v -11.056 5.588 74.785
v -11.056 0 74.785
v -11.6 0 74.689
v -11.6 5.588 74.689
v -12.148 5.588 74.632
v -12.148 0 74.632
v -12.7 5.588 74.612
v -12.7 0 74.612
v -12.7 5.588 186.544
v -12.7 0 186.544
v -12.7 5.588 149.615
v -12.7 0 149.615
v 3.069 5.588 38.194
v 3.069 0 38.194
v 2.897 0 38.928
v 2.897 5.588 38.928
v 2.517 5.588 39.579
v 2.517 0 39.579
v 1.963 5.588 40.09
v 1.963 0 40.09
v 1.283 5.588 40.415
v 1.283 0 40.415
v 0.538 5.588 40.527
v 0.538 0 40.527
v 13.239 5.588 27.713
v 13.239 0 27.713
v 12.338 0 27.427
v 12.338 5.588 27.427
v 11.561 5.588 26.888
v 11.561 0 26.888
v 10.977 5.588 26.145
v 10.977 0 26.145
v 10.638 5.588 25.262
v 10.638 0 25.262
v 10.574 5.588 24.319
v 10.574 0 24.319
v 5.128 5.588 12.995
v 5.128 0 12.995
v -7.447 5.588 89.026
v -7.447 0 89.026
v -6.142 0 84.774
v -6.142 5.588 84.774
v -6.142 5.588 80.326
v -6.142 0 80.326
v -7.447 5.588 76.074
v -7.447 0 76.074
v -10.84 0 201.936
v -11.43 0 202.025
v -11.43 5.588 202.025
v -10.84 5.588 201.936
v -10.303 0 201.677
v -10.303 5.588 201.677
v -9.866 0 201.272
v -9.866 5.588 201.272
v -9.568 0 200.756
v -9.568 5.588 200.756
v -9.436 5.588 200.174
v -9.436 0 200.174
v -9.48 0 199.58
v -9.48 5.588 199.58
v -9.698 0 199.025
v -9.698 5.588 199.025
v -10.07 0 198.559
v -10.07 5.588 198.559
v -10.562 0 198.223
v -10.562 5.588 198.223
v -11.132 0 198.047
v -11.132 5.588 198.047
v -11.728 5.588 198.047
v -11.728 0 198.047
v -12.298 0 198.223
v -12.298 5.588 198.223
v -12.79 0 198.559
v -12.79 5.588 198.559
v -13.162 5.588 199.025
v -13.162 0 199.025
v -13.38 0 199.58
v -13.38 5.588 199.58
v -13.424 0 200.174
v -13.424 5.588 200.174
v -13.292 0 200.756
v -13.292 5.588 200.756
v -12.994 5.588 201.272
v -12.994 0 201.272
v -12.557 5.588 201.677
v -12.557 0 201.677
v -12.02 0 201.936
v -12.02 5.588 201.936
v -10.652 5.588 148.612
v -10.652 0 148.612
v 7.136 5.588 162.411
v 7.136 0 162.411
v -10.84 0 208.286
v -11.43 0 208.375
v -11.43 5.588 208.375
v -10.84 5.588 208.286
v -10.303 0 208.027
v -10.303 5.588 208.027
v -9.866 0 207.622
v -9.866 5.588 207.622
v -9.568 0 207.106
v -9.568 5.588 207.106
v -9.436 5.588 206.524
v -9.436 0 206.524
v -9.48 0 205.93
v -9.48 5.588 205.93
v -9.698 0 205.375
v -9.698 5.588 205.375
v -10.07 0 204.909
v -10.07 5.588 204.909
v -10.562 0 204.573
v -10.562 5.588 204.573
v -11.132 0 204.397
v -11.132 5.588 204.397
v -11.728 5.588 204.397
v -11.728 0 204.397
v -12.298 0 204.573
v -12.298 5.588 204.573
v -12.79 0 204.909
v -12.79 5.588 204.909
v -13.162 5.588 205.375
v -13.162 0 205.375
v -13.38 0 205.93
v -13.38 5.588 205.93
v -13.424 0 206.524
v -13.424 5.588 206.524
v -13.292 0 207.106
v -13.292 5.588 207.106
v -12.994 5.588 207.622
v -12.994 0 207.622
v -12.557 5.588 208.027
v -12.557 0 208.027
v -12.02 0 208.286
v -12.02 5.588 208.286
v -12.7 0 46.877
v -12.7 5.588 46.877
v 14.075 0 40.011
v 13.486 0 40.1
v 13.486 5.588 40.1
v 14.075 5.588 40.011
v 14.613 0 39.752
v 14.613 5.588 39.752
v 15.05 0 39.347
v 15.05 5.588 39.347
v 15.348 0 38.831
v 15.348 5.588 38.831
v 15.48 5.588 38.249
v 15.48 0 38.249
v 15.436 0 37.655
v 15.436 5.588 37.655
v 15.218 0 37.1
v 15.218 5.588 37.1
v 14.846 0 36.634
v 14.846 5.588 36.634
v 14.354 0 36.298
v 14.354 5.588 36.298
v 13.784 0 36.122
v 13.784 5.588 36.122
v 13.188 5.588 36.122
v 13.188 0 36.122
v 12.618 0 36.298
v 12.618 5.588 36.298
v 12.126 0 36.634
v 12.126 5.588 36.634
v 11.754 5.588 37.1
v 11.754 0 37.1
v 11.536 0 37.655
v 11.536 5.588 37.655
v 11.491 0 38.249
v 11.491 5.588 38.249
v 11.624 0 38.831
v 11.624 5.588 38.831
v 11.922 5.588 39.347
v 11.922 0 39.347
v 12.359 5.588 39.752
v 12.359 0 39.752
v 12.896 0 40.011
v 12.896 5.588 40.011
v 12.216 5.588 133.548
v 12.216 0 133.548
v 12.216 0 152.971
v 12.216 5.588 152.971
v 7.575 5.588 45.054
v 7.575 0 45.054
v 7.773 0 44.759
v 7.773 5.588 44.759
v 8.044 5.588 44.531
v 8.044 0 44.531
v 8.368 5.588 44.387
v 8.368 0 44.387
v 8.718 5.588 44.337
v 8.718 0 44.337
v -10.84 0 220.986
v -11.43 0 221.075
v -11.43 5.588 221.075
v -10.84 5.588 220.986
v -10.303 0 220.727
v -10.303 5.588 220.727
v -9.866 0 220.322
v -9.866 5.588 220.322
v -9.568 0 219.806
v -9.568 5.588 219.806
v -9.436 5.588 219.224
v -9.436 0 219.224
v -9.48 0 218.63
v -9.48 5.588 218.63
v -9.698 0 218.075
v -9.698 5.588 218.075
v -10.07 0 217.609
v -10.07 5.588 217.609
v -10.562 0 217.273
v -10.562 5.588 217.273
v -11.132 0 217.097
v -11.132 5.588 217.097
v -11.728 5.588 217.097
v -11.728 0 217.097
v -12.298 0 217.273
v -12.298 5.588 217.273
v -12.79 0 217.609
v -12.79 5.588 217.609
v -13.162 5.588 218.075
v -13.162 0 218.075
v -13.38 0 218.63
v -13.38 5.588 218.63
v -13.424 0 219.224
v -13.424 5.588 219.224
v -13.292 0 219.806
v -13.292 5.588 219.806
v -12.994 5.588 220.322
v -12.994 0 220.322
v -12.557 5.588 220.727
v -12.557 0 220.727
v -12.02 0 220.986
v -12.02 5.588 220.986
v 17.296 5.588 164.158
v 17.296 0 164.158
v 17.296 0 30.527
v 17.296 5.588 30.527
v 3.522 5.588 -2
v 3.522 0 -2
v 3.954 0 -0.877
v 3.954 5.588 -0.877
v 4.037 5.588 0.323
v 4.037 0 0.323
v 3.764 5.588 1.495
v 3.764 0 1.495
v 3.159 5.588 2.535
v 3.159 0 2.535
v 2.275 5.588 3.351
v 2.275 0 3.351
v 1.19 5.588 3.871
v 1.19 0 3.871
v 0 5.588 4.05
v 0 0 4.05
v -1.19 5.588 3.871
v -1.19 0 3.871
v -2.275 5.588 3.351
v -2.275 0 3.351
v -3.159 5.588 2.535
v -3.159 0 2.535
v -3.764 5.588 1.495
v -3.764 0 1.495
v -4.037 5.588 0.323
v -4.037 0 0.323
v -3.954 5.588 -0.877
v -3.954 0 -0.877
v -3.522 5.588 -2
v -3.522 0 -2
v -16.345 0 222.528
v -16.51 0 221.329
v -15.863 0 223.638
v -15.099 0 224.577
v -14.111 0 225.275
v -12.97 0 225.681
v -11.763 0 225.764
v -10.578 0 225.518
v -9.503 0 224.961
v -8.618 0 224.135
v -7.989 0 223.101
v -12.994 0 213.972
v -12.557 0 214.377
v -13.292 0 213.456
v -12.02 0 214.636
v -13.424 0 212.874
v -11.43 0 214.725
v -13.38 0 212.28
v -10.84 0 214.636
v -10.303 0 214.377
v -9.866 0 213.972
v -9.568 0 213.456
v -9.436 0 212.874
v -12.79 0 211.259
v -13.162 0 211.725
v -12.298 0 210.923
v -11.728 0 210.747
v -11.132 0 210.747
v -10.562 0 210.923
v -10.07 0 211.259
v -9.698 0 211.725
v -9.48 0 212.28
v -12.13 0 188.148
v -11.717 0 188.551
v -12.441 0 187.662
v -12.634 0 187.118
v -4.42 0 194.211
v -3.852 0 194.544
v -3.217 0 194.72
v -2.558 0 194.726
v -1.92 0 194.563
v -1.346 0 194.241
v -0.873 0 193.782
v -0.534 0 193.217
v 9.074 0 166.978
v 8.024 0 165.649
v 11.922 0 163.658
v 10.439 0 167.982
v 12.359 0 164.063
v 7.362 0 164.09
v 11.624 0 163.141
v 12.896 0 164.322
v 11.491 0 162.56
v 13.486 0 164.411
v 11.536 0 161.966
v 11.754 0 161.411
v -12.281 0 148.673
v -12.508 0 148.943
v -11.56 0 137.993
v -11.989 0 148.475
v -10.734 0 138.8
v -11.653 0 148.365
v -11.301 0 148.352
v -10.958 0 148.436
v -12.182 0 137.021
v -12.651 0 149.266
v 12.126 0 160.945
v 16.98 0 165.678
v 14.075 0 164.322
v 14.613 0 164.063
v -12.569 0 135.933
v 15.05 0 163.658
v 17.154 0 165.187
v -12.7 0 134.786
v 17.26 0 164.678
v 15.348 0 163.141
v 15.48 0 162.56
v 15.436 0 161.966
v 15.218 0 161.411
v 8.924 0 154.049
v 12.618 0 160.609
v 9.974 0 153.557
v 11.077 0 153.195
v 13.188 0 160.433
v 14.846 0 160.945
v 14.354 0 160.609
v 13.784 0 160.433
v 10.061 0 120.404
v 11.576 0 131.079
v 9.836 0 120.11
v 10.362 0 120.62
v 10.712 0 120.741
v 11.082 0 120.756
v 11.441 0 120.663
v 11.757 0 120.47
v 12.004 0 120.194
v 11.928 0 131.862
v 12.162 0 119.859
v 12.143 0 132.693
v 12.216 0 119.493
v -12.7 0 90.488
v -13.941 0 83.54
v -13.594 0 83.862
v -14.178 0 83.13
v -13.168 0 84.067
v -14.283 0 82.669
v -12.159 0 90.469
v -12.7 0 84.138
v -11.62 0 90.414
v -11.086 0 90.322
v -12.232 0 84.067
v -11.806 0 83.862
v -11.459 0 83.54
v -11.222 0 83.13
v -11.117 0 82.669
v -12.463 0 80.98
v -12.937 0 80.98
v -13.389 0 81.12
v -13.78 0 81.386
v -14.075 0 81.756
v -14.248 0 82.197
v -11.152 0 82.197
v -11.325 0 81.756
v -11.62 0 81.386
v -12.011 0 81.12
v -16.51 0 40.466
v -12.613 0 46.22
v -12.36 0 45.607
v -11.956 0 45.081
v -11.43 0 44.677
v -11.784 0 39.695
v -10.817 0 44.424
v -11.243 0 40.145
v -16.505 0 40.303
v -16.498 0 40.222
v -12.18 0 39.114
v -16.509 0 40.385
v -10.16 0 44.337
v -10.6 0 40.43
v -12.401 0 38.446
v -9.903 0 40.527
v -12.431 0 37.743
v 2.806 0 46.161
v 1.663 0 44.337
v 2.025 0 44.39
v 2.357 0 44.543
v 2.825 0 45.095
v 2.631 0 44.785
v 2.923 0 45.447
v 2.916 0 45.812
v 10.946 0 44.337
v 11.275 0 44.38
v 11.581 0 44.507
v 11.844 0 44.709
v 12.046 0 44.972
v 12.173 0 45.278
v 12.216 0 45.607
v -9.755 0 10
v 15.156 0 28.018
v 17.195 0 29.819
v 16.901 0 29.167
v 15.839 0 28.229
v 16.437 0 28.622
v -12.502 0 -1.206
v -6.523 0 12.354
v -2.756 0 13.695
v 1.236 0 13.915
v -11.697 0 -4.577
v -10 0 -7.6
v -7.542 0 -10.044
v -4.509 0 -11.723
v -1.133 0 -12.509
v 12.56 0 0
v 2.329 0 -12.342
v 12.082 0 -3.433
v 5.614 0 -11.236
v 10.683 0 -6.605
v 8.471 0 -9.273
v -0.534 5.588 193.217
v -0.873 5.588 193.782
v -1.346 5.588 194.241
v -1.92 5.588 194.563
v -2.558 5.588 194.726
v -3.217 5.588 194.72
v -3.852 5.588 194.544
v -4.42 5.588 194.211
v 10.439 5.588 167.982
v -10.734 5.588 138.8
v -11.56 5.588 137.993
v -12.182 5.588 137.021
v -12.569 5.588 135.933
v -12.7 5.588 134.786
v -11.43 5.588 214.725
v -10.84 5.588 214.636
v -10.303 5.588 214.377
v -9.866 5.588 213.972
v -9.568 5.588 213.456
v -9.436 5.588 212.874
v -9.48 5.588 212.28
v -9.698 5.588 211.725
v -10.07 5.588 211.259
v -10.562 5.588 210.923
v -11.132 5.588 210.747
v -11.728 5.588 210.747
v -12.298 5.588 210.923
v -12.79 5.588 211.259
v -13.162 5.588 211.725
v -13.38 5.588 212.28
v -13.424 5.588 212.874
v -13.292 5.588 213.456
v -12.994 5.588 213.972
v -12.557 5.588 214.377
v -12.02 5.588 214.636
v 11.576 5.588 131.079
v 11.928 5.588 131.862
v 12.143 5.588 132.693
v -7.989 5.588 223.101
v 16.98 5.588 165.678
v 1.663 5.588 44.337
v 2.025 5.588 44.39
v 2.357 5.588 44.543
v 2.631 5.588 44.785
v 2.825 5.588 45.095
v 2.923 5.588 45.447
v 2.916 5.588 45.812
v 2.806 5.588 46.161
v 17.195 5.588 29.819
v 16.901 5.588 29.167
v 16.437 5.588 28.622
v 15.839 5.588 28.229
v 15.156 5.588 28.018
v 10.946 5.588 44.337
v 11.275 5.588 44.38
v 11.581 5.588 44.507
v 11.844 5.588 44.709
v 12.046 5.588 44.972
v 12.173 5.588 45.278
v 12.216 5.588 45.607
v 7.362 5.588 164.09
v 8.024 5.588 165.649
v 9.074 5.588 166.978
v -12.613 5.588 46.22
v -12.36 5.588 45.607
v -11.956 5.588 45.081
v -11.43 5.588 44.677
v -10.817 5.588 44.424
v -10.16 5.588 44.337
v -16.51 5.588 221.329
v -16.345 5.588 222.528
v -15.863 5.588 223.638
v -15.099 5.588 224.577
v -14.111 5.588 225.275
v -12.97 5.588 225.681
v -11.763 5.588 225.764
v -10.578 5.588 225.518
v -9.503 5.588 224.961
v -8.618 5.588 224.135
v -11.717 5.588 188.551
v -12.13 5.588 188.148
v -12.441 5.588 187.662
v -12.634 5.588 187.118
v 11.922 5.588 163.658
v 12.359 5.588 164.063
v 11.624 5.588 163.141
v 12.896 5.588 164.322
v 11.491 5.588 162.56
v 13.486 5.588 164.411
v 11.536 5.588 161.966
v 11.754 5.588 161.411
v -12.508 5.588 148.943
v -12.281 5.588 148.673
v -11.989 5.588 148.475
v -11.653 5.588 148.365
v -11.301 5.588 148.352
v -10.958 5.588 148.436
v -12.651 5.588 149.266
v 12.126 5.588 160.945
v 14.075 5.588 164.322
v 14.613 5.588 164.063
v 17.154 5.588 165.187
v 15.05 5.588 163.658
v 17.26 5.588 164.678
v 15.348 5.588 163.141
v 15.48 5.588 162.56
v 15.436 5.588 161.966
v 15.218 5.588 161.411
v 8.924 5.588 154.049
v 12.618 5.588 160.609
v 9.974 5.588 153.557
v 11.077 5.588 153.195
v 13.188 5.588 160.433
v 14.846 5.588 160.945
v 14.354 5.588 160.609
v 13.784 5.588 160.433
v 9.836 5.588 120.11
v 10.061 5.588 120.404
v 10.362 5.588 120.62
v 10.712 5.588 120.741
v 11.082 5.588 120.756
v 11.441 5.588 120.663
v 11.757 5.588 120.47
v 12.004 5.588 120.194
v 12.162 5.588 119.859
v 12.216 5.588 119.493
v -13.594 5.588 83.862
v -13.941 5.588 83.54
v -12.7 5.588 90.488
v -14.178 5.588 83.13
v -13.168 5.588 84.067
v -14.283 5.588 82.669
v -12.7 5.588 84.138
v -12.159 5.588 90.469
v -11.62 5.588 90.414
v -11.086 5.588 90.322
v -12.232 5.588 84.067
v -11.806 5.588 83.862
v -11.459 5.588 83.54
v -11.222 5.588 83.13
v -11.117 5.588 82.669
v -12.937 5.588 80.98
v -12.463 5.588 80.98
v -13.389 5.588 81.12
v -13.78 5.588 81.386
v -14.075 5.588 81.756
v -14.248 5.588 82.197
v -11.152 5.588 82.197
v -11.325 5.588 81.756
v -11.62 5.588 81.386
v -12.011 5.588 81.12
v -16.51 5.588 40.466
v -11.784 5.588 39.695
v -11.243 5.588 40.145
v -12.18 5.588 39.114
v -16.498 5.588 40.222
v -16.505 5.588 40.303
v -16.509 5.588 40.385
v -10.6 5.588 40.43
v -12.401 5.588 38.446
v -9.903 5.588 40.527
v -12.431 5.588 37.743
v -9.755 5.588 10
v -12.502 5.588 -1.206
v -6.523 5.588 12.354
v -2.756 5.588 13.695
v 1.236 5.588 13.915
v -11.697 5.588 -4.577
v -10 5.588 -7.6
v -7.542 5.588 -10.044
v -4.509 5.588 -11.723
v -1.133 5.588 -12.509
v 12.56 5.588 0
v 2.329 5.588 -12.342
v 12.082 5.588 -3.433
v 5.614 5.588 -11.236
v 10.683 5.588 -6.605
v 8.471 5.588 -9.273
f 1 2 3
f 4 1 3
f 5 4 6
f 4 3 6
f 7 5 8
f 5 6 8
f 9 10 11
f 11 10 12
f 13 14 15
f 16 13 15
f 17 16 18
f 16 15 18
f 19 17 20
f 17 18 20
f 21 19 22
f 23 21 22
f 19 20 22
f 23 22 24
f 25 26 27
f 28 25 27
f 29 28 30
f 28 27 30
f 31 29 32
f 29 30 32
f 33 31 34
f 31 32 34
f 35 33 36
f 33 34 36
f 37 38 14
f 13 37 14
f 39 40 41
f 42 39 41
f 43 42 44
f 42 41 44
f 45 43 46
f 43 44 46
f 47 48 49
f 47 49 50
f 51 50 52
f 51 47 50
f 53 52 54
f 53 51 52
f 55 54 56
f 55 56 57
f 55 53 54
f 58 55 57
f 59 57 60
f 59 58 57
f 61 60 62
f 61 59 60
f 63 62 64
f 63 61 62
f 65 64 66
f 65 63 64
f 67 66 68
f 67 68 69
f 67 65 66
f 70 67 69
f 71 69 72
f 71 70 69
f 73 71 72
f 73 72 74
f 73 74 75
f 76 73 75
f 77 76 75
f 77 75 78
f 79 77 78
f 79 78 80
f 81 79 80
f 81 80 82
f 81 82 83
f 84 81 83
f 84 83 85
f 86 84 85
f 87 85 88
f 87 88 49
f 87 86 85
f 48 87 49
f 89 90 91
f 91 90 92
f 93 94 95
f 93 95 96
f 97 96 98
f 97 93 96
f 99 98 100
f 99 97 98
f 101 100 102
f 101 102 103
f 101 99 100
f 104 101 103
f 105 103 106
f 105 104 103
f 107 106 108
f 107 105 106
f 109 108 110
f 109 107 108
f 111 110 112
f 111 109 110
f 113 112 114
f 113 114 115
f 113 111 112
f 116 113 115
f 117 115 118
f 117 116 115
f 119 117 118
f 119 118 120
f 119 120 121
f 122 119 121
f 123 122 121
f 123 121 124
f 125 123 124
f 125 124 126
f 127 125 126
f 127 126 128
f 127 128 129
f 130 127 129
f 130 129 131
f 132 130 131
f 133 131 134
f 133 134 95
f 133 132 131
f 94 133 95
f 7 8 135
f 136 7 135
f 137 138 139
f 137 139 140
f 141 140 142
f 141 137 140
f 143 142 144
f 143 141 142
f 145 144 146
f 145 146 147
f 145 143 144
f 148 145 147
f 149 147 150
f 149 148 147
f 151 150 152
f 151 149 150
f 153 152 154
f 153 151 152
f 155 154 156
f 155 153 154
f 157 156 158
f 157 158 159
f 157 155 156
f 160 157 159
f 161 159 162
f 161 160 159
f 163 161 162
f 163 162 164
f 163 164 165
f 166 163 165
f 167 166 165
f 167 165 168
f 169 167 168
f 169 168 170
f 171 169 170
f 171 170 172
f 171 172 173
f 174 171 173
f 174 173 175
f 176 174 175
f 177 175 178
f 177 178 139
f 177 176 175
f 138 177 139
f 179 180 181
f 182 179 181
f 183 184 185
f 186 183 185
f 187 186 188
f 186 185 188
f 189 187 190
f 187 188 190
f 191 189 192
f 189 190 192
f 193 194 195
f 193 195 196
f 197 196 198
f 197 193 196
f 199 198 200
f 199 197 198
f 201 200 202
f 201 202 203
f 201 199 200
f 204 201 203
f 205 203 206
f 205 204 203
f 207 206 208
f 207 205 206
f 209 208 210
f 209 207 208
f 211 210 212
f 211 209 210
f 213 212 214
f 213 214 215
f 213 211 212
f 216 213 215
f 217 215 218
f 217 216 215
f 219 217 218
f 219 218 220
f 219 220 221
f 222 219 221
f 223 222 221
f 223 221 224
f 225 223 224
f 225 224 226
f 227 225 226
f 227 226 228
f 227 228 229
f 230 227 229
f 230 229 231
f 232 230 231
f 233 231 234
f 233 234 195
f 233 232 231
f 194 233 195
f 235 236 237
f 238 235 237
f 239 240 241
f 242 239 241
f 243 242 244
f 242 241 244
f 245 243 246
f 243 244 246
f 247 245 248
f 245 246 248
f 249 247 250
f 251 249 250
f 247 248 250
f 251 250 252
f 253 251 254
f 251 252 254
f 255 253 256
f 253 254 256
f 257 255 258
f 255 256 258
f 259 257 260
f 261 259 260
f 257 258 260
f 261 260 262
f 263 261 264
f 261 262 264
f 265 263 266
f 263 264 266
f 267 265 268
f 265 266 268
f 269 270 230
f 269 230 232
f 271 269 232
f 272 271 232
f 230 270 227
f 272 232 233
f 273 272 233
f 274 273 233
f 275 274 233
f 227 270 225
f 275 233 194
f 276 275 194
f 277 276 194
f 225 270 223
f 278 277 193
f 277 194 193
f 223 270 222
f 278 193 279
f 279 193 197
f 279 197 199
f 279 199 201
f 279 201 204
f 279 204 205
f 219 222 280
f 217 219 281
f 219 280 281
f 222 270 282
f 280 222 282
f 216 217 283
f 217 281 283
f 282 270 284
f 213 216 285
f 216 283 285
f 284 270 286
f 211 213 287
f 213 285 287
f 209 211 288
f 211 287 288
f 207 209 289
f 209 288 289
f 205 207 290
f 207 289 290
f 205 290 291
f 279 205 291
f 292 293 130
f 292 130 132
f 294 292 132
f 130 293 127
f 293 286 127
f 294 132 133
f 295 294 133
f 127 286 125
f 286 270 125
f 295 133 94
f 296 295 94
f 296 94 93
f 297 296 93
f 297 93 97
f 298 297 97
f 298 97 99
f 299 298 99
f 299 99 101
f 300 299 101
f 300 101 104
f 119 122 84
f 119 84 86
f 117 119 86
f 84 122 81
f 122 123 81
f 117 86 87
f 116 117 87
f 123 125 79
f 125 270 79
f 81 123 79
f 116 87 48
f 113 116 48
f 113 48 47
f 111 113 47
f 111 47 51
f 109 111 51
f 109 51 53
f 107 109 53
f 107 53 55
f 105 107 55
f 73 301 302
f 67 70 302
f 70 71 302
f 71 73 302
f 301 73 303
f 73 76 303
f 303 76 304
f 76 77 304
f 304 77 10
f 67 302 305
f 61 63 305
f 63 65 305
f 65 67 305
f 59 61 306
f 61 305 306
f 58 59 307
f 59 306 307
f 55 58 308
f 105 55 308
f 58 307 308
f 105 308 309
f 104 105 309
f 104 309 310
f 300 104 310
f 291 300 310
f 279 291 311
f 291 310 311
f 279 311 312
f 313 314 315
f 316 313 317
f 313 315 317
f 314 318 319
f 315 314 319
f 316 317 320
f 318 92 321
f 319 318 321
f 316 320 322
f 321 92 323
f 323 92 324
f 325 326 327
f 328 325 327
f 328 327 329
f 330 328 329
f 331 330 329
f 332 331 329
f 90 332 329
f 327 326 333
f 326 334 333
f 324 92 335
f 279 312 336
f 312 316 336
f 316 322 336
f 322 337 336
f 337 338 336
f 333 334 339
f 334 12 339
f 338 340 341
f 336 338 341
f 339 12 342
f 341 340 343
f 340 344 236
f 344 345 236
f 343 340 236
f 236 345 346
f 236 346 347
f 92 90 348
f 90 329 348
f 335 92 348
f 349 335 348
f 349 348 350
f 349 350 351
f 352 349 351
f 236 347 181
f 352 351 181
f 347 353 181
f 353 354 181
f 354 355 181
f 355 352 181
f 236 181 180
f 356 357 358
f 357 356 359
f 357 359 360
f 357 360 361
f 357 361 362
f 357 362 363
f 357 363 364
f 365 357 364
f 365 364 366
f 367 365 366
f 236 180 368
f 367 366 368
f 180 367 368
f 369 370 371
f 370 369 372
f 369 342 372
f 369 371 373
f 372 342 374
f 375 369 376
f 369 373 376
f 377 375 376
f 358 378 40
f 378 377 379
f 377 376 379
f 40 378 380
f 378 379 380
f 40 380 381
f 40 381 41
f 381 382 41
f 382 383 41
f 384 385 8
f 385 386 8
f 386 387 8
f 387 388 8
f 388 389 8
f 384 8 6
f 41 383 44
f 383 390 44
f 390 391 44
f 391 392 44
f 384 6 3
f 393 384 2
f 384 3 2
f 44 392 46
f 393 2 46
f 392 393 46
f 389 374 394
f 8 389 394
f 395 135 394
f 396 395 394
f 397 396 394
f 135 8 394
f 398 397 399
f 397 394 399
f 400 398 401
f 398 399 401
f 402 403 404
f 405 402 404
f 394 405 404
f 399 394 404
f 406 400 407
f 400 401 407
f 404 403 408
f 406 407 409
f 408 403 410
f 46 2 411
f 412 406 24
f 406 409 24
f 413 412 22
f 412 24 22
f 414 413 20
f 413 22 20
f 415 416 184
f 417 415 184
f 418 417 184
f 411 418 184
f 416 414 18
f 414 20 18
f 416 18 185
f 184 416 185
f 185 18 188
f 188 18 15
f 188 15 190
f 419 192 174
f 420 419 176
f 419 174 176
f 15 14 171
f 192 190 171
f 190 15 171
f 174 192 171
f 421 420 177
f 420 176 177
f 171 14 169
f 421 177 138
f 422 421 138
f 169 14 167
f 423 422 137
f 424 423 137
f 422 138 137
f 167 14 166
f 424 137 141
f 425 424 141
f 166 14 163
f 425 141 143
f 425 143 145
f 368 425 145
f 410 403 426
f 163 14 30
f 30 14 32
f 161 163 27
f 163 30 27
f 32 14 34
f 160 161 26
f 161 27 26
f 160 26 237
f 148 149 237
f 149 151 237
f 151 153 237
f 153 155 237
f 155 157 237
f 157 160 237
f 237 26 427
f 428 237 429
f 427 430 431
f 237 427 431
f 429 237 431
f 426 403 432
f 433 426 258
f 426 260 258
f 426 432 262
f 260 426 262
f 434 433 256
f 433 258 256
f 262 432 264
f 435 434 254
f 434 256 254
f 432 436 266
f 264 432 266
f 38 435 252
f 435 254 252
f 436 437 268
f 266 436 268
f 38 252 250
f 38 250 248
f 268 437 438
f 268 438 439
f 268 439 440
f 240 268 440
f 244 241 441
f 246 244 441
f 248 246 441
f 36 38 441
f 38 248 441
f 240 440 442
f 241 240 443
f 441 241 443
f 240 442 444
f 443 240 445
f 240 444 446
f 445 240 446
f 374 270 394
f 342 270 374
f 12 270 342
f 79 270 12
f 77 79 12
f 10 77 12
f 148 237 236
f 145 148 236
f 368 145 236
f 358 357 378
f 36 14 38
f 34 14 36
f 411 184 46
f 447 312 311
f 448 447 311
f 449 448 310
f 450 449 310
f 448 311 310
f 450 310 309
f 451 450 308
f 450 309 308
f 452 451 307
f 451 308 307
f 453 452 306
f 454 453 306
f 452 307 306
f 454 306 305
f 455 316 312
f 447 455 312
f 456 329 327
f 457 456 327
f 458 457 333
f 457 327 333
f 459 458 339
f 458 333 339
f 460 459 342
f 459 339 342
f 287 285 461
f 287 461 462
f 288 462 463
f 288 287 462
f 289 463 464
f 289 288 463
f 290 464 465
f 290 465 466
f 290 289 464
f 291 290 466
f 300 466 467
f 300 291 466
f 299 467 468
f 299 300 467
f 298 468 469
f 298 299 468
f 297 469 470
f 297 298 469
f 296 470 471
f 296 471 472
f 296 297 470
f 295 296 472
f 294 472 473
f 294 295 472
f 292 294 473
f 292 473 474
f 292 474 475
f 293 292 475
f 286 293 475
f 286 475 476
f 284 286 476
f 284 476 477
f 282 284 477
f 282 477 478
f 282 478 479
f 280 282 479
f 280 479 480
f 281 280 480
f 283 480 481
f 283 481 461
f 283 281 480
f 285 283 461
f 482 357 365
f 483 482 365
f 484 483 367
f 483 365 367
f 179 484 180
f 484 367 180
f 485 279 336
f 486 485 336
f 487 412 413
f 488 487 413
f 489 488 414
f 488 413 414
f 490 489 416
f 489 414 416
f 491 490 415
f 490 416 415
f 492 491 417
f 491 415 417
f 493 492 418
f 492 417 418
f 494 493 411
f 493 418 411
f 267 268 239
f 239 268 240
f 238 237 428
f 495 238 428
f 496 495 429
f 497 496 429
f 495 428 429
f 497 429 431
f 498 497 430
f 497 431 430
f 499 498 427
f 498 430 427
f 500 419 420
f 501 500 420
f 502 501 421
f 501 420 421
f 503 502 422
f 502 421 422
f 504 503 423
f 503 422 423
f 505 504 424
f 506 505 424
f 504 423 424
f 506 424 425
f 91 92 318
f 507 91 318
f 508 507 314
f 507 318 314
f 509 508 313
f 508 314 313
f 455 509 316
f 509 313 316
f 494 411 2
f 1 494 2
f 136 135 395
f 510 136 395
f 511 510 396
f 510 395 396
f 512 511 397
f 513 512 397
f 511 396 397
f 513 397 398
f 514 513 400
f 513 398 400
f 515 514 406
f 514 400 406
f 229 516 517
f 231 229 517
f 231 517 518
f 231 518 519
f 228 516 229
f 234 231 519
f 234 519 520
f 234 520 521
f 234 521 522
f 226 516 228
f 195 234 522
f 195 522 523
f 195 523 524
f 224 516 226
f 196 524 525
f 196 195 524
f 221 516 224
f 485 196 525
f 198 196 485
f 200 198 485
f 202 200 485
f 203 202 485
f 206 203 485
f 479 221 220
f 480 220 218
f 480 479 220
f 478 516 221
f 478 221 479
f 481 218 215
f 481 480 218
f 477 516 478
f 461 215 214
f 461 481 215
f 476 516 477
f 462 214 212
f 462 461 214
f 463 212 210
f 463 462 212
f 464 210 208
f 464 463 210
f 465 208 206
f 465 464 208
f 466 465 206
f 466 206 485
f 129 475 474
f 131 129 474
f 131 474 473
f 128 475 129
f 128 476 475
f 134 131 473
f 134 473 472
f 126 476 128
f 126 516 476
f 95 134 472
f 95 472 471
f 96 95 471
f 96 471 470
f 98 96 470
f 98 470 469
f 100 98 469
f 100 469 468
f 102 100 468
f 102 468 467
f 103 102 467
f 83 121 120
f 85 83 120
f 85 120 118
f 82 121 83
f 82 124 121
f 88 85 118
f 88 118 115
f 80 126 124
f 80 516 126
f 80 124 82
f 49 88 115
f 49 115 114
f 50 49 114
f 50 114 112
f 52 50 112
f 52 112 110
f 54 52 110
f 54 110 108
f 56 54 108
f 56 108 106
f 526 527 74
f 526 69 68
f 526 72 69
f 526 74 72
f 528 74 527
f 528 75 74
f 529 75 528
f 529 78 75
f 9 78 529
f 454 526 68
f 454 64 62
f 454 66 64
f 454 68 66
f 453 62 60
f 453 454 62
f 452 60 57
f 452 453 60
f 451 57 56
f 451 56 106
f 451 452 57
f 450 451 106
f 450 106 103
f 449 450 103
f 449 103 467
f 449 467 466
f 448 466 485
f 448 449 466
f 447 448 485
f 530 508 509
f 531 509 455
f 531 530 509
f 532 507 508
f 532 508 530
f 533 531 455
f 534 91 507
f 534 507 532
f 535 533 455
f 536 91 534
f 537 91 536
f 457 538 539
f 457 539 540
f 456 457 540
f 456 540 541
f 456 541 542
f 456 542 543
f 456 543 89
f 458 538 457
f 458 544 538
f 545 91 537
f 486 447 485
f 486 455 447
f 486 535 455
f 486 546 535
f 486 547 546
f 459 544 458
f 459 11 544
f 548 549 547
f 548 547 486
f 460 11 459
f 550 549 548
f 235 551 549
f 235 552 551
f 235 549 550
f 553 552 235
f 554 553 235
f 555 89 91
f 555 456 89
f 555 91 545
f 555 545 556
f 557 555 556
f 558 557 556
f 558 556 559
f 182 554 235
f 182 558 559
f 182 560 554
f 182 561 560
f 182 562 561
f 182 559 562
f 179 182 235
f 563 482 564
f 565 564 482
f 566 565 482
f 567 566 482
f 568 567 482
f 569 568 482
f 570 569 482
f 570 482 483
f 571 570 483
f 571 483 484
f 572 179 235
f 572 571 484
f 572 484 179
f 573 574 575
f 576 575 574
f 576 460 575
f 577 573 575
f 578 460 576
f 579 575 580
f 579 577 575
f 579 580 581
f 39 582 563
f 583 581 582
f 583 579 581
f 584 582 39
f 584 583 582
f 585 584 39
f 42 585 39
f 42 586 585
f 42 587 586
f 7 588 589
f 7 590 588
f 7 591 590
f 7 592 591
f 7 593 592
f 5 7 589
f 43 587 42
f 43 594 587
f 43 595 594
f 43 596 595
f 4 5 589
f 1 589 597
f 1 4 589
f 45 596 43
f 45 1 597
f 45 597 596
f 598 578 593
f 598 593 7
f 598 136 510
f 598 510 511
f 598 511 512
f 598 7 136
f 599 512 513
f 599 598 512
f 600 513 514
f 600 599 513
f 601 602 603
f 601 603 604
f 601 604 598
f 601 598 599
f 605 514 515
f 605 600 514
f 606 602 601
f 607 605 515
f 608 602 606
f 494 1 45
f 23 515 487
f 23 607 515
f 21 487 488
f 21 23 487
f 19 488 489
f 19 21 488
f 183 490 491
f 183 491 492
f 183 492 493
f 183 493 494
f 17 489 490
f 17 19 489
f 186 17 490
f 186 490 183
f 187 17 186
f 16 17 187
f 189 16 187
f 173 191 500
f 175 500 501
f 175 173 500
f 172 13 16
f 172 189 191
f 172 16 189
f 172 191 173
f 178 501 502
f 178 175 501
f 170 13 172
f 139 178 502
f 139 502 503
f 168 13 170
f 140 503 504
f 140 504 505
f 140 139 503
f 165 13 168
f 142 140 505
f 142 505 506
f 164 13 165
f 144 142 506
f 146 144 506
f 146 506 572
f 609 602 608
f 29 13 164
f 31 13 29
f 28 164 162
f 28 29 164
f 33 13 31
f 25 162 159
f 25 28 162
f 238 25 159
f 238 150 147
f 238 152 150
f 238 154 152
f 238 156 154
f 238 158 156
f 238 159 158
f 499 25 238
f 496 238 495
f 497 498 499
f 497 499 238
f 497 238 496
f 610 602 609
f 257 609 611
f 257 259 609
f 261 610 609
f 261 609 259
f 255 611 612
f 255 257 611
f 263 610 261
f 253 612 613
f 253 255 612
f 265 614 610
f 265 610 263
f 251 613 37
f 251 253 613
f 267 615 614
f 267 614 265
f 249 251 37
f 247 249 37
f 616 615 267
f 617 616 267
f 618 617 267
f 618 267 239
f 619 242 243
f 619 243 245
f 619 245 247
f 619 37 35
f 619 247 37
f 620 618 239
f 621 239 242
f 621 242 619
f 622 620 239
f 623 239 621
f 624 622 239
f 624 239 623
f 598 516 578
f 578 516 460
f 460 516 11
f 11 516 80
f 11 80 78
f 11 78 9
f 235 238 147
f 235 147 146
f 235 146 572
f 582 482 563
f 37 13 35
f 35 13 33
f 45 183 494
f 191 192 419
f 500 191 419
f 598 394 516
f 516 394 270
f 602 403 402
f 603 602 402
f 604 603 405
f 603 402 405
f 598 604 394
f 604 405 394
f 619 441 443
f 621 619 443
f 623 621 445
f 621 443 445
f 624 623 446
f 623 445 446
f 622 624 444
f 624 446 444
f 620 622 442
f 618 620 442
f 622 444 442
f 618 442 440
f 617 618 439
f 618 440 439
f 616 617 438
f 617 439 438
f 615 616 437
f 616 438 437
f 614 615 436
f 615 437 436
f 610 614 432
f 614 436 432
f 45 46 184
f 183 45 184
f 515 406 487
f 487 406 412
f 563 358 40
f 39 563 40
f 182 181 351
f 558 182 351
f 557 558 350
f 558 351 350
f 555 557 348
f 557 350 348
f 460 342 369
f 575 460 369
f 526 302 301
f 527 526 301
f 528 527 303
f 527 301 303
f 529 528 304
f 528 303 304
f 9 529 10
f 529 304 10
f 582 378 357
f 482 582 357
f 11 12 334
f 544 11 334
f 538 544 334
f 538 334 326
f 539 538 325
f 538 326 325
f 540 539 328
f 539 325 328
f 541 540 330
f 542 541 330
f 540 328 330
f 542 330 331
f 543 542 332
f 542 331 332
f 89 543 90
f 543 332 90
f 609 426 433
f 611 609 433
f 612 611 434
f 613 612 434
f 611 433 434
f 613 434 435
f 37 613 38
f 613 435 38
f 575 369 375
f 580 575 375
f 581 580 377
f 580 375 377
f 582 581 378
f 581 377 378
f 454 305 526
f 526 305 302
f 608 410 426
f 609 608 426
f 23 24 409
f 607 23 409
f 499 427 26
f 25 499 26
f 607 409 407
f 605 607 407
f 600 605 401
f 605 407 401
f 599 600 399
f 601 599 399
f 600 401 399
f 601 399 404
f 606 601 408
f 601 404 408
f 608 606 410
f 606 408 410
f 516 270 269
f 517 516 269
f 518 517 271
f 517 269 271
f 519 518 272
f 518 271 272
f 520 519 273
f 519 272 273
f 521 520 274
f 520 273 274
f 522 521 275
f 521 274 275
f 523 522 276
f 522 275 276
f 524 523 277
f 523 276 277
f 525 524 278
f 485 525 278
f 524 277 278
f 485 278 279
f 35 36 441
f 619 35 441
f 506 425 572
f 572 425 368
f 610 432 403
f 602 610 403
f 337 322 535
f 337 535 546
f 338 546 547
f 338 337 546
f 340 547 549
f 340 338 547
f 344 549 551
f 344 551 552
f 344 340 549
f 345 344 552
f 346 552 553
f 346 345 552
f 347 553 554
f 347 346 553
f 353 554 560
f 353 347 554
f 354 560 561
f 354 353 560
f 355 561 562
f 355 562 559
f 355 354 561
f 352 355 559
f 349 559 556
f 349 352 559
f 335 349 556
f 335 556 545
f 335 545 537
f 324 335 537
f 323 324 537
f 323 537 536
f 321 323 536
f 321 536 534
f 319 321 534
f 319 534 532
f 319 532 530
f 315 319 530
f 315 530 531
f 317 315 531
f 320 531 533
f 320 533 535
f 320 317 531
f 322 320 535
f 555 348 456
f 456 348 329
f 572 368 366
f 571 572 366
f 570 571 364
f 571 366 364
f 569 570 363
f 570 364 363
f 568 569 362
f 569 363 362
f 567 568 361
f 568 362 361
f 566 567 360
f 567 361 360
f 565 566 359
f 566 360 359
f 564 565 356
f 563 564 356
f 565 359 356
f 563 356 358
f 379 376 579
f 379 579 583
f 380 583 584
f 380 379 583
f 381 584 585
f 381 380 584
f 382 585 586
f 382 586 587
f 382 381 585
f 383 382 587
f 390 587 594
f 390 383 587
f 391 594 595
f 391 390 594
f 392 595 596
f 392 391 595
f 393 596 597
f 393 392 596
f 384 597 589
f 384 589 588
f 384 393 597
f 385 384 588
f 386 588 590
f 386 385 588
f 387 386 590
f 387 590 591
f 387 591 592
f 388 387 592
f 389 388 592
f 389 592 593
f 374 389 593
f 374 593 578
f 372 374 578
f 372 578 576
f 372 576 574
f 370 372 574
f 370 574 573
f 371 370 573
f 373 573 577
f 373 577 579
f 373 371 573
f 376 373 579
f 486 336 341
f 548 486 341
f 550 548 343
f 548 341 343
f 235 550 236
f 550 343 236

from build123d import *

# Parameters (mm, degrees)
SKETCH2_R           = 2
SKETCH2_R_2         = 1.5875
SKETCH2_R_3         = 1.999999991
BOSS_EXTRUDE1_DEPTH = 5.588


with BuildPart() as part:
    # Sketch2 → Boss-Extrude1 (new body)
    with BuildSketch(Plane(origin=(0, 0, 0), x_dir=(1, 0, 0), z_dir=(0, 1, 0))):
        with BuildLine():
            ThreePointArc((17.295902343, -30.526810701), (16.688093876, -28.878103365), (15.15555913, -28.018449791))
            Line((15.15555913, -28.018449791), (13.238676936, -27.713033224))
            ThreePointArc((13.238676936, -27.713033224), (11.241051513, -26.538356195), (10.573787778, -24.319092227))
            Line((10.573787778, -24.319092227), (12.5603, 0))
            ThreePointArc((12.5603, 0), (0.603657177, 12.545785512), (-12.502275592, 1.2059192))
            Line((-12.502275592, 1.2059192), (-16.498266045, -40.222207921))
            ThreePointArc((-16.498266045, -40.222207921), (-16.507064815, -40.344000039), (-16.51, -40.466074291))
            Line((-16.51, -40.466074291), (-16.51, -221.328861788))
            ThreePointArc((-16.51, -221.328861788), (-12.970187584, -225.680718913), (-7.988667969, -223.101301399))
            Line((-7.988667969, -223.101301399), (16.979901226, -165.677523619))
            ThreePointArc((16.979901226, -165.677523619), (17.216065593, -164.934164738), (17.295902343, -164.158289667))
            Line((17.295902343, -164.158289667), (17.295902343, -30.526810701))
        make_face()
        with Locations(Location((-11.43, -219.075, 0), (0, 0, 270))):
            Circle(SKETCH2_R, mode=Mode.SUBTRACT)
        with Locations(Location((-11.43, -212.725, 0), (0, 0, 270))):
            Circle(SKETCH2_R, mode=Mode.SUBTRACT)
        with Locations(Location((-11.43, -206.375, 0), (0, 0, 270))):
            Circle(SKETCH2_R, mode=Mode.SUBTRACT)
        with Locations(Location((-11.43, -200.025, 0), (0, 0, 270))):
            Circle(SKETCH2_R, mode=Mode.SUBTRACT)
        with BuildLine():
            ThreePointArc((7.135902343, -162.410770806), (8.023611961, -165.648962244), (10.438542905, -167.981776143))
            Line((10.438542905, -167.981776143), (-0.534170778, -193.217289931))
            ThreePointArc((-0.534170778, -193.217289931), (-2.234040931, -194.665234867), (-4.420389569, -194.211381682))
            Line((-4.420389569, -194.211381682), (-11.716886202, -188.551043102))
            ThreePointArc((-11.716886202, -188.551043102), (-12.441018517, -187.661516081), (-12.7, -186.544128716))
            Line((-12.7, -186.544128716), (-12.7, -149.615408258))
            ThreePointArc((-12.7, -149.615408258), (-11.988693683, -148.474898999), (-10.651556899, -148.611951065))
            Line((-10.651556899, -148.611951065), (7.135902343, -162.410770806))
        make_face(mode=Mode.SUBTRACT)
        with BuildLine():
            ThreePointArc((12.215902343, -152.970817152), (10.520298026, -153.359206519), (8.923603828, -154.049487576))
            Line((8.923603828, -154.049487576), (-10.733772403, -138.80005889))
            ThreePointArc((-10.733772403, -138.80005889), (-12.182037035, -137.021004847), (-12.7, -134.786230117))
            Line((-12.7, -134.786230117), (-12.7, -90.4875))
            ThreePointArc((-12.7, -90.4875), (-11.888769677, -90.445936399), (-11.086035141, -90.321680879))
            Line((-11.086035141, -90.321680879), (11.575760855, -131.079432803))
            ThreePointArc((11.575760855, -131.079432803), (12.053263487, -132.272915946), (12.215902343, -133.548047069))
            Line((12.215902343, -133.548047069), (12.215902343, -152.970817152))
        make_face(mode=Mode.SUBTRACT)
        with Locations(Location((13.485902343, -162.410770806, 0), (0, 0, 270))):
            Circle(SKETCH2_R, mode=Mode.SUBTRACT)
        with Locations(Location((-12.7, -82.55, 0), (0, 0, 270))):
            Circle(SKETCH2_R_2, mode=Mode.SUBTRACT)
        with BuildLine():
            Line((-10.16, -44.337182032), (1.663048834, -44.337182032))
            ThreePointArc((1.663048834, -44.337182032), (2.739129831, -44.932682449), (2.806066447, -46.160725831))
            Line((2.806066447, -46.160725831), (-11.055993219, -74.784618621))
            ThreePointArc((-11.055993219, -74.784618621), (-11.873503915, -74.655646925), (-12.7, -74.6125))
            Line((-12.7, -74.6125), (-12.7, -46.877182032))
            ThreePointArc((-12.7, -46.877182032), (-11.956051224, -45.081130808), (-10.16, -44.337182032))
        make_face(mode=Mode.SUBTRACT)
        with BuildLine():
            ThreePointArc((-9.903213406, -40.527182032), (-11.783508673, -39.694838236), (-12.431479451, -37.743315662))
            Line((-12.431479451, -37.743315662), (-9.755434212, -9.99962016))
            ThreePointArc((-9.755434212, -9.99962016), (-2.756273581, -13.695395429), (5.127655889, -12.99492382))
            Line((5.127655889, -12.99492382), (3.069264048, -38.19397392))
            ThreePointArc((3.069264048, -38.19397392), (2.259083254, -39.854914801), (0.537695935, -40.527182032))
            Line((0.537695935, -40.527182032), (-9.903213406, -40.527182032))
        make_face(mode=Mode.SUBTRACT)
        with BuildLine():
            Line((-3.521718331, 2), (3.521718331, 2))
            ThreePointArc((3.521718331, 2), (0, -4.05), (-3.521718331, 2))
        make_face(mode=Mode.SUBTRACT)
        with BuildLine():
            ThreePointArc((-7.44734835, -89.025591197), (-5.976040897, -82.55), (-7.44734835, -76.074408803))
            Line((-7.44734835, -76.074408803), (7.575478058, -45.053638233))
            ThreePointArc((7.575478058, -45.053638233), (8.043996088, -44.531101035), (8.718495671, -44.337182032))
            Line((8.718495671, -44.337182032), (10.945902343, -44.337182032))
            ThreePointArc((10.945902343, -44.337182032), (11.843927955, -44.70915642), (12.215902343, -45.607182032))
            Line((12.215902343, -45.607182032), (12.215902343, -119.492817968))
            ThreePointArc((12.215902343, -119.492817968), (11.264685124, -120.722158254), (9.835937715, -120.109971535))
            Line((9.835937715, -120.109971535), (-7.44734835, -89.025591197))
        make_face(mode=Mode.SUBTRACT)
        with Locations(Location((13.485902343, -38.1, 0), (0, 0, 270))):
            Circle(SKETCH2_R_3, mode=Mode.SUBTRACT)
    extrude(amount=BOSS_EXTRUDE1_DEPTH)


solid = part.part
